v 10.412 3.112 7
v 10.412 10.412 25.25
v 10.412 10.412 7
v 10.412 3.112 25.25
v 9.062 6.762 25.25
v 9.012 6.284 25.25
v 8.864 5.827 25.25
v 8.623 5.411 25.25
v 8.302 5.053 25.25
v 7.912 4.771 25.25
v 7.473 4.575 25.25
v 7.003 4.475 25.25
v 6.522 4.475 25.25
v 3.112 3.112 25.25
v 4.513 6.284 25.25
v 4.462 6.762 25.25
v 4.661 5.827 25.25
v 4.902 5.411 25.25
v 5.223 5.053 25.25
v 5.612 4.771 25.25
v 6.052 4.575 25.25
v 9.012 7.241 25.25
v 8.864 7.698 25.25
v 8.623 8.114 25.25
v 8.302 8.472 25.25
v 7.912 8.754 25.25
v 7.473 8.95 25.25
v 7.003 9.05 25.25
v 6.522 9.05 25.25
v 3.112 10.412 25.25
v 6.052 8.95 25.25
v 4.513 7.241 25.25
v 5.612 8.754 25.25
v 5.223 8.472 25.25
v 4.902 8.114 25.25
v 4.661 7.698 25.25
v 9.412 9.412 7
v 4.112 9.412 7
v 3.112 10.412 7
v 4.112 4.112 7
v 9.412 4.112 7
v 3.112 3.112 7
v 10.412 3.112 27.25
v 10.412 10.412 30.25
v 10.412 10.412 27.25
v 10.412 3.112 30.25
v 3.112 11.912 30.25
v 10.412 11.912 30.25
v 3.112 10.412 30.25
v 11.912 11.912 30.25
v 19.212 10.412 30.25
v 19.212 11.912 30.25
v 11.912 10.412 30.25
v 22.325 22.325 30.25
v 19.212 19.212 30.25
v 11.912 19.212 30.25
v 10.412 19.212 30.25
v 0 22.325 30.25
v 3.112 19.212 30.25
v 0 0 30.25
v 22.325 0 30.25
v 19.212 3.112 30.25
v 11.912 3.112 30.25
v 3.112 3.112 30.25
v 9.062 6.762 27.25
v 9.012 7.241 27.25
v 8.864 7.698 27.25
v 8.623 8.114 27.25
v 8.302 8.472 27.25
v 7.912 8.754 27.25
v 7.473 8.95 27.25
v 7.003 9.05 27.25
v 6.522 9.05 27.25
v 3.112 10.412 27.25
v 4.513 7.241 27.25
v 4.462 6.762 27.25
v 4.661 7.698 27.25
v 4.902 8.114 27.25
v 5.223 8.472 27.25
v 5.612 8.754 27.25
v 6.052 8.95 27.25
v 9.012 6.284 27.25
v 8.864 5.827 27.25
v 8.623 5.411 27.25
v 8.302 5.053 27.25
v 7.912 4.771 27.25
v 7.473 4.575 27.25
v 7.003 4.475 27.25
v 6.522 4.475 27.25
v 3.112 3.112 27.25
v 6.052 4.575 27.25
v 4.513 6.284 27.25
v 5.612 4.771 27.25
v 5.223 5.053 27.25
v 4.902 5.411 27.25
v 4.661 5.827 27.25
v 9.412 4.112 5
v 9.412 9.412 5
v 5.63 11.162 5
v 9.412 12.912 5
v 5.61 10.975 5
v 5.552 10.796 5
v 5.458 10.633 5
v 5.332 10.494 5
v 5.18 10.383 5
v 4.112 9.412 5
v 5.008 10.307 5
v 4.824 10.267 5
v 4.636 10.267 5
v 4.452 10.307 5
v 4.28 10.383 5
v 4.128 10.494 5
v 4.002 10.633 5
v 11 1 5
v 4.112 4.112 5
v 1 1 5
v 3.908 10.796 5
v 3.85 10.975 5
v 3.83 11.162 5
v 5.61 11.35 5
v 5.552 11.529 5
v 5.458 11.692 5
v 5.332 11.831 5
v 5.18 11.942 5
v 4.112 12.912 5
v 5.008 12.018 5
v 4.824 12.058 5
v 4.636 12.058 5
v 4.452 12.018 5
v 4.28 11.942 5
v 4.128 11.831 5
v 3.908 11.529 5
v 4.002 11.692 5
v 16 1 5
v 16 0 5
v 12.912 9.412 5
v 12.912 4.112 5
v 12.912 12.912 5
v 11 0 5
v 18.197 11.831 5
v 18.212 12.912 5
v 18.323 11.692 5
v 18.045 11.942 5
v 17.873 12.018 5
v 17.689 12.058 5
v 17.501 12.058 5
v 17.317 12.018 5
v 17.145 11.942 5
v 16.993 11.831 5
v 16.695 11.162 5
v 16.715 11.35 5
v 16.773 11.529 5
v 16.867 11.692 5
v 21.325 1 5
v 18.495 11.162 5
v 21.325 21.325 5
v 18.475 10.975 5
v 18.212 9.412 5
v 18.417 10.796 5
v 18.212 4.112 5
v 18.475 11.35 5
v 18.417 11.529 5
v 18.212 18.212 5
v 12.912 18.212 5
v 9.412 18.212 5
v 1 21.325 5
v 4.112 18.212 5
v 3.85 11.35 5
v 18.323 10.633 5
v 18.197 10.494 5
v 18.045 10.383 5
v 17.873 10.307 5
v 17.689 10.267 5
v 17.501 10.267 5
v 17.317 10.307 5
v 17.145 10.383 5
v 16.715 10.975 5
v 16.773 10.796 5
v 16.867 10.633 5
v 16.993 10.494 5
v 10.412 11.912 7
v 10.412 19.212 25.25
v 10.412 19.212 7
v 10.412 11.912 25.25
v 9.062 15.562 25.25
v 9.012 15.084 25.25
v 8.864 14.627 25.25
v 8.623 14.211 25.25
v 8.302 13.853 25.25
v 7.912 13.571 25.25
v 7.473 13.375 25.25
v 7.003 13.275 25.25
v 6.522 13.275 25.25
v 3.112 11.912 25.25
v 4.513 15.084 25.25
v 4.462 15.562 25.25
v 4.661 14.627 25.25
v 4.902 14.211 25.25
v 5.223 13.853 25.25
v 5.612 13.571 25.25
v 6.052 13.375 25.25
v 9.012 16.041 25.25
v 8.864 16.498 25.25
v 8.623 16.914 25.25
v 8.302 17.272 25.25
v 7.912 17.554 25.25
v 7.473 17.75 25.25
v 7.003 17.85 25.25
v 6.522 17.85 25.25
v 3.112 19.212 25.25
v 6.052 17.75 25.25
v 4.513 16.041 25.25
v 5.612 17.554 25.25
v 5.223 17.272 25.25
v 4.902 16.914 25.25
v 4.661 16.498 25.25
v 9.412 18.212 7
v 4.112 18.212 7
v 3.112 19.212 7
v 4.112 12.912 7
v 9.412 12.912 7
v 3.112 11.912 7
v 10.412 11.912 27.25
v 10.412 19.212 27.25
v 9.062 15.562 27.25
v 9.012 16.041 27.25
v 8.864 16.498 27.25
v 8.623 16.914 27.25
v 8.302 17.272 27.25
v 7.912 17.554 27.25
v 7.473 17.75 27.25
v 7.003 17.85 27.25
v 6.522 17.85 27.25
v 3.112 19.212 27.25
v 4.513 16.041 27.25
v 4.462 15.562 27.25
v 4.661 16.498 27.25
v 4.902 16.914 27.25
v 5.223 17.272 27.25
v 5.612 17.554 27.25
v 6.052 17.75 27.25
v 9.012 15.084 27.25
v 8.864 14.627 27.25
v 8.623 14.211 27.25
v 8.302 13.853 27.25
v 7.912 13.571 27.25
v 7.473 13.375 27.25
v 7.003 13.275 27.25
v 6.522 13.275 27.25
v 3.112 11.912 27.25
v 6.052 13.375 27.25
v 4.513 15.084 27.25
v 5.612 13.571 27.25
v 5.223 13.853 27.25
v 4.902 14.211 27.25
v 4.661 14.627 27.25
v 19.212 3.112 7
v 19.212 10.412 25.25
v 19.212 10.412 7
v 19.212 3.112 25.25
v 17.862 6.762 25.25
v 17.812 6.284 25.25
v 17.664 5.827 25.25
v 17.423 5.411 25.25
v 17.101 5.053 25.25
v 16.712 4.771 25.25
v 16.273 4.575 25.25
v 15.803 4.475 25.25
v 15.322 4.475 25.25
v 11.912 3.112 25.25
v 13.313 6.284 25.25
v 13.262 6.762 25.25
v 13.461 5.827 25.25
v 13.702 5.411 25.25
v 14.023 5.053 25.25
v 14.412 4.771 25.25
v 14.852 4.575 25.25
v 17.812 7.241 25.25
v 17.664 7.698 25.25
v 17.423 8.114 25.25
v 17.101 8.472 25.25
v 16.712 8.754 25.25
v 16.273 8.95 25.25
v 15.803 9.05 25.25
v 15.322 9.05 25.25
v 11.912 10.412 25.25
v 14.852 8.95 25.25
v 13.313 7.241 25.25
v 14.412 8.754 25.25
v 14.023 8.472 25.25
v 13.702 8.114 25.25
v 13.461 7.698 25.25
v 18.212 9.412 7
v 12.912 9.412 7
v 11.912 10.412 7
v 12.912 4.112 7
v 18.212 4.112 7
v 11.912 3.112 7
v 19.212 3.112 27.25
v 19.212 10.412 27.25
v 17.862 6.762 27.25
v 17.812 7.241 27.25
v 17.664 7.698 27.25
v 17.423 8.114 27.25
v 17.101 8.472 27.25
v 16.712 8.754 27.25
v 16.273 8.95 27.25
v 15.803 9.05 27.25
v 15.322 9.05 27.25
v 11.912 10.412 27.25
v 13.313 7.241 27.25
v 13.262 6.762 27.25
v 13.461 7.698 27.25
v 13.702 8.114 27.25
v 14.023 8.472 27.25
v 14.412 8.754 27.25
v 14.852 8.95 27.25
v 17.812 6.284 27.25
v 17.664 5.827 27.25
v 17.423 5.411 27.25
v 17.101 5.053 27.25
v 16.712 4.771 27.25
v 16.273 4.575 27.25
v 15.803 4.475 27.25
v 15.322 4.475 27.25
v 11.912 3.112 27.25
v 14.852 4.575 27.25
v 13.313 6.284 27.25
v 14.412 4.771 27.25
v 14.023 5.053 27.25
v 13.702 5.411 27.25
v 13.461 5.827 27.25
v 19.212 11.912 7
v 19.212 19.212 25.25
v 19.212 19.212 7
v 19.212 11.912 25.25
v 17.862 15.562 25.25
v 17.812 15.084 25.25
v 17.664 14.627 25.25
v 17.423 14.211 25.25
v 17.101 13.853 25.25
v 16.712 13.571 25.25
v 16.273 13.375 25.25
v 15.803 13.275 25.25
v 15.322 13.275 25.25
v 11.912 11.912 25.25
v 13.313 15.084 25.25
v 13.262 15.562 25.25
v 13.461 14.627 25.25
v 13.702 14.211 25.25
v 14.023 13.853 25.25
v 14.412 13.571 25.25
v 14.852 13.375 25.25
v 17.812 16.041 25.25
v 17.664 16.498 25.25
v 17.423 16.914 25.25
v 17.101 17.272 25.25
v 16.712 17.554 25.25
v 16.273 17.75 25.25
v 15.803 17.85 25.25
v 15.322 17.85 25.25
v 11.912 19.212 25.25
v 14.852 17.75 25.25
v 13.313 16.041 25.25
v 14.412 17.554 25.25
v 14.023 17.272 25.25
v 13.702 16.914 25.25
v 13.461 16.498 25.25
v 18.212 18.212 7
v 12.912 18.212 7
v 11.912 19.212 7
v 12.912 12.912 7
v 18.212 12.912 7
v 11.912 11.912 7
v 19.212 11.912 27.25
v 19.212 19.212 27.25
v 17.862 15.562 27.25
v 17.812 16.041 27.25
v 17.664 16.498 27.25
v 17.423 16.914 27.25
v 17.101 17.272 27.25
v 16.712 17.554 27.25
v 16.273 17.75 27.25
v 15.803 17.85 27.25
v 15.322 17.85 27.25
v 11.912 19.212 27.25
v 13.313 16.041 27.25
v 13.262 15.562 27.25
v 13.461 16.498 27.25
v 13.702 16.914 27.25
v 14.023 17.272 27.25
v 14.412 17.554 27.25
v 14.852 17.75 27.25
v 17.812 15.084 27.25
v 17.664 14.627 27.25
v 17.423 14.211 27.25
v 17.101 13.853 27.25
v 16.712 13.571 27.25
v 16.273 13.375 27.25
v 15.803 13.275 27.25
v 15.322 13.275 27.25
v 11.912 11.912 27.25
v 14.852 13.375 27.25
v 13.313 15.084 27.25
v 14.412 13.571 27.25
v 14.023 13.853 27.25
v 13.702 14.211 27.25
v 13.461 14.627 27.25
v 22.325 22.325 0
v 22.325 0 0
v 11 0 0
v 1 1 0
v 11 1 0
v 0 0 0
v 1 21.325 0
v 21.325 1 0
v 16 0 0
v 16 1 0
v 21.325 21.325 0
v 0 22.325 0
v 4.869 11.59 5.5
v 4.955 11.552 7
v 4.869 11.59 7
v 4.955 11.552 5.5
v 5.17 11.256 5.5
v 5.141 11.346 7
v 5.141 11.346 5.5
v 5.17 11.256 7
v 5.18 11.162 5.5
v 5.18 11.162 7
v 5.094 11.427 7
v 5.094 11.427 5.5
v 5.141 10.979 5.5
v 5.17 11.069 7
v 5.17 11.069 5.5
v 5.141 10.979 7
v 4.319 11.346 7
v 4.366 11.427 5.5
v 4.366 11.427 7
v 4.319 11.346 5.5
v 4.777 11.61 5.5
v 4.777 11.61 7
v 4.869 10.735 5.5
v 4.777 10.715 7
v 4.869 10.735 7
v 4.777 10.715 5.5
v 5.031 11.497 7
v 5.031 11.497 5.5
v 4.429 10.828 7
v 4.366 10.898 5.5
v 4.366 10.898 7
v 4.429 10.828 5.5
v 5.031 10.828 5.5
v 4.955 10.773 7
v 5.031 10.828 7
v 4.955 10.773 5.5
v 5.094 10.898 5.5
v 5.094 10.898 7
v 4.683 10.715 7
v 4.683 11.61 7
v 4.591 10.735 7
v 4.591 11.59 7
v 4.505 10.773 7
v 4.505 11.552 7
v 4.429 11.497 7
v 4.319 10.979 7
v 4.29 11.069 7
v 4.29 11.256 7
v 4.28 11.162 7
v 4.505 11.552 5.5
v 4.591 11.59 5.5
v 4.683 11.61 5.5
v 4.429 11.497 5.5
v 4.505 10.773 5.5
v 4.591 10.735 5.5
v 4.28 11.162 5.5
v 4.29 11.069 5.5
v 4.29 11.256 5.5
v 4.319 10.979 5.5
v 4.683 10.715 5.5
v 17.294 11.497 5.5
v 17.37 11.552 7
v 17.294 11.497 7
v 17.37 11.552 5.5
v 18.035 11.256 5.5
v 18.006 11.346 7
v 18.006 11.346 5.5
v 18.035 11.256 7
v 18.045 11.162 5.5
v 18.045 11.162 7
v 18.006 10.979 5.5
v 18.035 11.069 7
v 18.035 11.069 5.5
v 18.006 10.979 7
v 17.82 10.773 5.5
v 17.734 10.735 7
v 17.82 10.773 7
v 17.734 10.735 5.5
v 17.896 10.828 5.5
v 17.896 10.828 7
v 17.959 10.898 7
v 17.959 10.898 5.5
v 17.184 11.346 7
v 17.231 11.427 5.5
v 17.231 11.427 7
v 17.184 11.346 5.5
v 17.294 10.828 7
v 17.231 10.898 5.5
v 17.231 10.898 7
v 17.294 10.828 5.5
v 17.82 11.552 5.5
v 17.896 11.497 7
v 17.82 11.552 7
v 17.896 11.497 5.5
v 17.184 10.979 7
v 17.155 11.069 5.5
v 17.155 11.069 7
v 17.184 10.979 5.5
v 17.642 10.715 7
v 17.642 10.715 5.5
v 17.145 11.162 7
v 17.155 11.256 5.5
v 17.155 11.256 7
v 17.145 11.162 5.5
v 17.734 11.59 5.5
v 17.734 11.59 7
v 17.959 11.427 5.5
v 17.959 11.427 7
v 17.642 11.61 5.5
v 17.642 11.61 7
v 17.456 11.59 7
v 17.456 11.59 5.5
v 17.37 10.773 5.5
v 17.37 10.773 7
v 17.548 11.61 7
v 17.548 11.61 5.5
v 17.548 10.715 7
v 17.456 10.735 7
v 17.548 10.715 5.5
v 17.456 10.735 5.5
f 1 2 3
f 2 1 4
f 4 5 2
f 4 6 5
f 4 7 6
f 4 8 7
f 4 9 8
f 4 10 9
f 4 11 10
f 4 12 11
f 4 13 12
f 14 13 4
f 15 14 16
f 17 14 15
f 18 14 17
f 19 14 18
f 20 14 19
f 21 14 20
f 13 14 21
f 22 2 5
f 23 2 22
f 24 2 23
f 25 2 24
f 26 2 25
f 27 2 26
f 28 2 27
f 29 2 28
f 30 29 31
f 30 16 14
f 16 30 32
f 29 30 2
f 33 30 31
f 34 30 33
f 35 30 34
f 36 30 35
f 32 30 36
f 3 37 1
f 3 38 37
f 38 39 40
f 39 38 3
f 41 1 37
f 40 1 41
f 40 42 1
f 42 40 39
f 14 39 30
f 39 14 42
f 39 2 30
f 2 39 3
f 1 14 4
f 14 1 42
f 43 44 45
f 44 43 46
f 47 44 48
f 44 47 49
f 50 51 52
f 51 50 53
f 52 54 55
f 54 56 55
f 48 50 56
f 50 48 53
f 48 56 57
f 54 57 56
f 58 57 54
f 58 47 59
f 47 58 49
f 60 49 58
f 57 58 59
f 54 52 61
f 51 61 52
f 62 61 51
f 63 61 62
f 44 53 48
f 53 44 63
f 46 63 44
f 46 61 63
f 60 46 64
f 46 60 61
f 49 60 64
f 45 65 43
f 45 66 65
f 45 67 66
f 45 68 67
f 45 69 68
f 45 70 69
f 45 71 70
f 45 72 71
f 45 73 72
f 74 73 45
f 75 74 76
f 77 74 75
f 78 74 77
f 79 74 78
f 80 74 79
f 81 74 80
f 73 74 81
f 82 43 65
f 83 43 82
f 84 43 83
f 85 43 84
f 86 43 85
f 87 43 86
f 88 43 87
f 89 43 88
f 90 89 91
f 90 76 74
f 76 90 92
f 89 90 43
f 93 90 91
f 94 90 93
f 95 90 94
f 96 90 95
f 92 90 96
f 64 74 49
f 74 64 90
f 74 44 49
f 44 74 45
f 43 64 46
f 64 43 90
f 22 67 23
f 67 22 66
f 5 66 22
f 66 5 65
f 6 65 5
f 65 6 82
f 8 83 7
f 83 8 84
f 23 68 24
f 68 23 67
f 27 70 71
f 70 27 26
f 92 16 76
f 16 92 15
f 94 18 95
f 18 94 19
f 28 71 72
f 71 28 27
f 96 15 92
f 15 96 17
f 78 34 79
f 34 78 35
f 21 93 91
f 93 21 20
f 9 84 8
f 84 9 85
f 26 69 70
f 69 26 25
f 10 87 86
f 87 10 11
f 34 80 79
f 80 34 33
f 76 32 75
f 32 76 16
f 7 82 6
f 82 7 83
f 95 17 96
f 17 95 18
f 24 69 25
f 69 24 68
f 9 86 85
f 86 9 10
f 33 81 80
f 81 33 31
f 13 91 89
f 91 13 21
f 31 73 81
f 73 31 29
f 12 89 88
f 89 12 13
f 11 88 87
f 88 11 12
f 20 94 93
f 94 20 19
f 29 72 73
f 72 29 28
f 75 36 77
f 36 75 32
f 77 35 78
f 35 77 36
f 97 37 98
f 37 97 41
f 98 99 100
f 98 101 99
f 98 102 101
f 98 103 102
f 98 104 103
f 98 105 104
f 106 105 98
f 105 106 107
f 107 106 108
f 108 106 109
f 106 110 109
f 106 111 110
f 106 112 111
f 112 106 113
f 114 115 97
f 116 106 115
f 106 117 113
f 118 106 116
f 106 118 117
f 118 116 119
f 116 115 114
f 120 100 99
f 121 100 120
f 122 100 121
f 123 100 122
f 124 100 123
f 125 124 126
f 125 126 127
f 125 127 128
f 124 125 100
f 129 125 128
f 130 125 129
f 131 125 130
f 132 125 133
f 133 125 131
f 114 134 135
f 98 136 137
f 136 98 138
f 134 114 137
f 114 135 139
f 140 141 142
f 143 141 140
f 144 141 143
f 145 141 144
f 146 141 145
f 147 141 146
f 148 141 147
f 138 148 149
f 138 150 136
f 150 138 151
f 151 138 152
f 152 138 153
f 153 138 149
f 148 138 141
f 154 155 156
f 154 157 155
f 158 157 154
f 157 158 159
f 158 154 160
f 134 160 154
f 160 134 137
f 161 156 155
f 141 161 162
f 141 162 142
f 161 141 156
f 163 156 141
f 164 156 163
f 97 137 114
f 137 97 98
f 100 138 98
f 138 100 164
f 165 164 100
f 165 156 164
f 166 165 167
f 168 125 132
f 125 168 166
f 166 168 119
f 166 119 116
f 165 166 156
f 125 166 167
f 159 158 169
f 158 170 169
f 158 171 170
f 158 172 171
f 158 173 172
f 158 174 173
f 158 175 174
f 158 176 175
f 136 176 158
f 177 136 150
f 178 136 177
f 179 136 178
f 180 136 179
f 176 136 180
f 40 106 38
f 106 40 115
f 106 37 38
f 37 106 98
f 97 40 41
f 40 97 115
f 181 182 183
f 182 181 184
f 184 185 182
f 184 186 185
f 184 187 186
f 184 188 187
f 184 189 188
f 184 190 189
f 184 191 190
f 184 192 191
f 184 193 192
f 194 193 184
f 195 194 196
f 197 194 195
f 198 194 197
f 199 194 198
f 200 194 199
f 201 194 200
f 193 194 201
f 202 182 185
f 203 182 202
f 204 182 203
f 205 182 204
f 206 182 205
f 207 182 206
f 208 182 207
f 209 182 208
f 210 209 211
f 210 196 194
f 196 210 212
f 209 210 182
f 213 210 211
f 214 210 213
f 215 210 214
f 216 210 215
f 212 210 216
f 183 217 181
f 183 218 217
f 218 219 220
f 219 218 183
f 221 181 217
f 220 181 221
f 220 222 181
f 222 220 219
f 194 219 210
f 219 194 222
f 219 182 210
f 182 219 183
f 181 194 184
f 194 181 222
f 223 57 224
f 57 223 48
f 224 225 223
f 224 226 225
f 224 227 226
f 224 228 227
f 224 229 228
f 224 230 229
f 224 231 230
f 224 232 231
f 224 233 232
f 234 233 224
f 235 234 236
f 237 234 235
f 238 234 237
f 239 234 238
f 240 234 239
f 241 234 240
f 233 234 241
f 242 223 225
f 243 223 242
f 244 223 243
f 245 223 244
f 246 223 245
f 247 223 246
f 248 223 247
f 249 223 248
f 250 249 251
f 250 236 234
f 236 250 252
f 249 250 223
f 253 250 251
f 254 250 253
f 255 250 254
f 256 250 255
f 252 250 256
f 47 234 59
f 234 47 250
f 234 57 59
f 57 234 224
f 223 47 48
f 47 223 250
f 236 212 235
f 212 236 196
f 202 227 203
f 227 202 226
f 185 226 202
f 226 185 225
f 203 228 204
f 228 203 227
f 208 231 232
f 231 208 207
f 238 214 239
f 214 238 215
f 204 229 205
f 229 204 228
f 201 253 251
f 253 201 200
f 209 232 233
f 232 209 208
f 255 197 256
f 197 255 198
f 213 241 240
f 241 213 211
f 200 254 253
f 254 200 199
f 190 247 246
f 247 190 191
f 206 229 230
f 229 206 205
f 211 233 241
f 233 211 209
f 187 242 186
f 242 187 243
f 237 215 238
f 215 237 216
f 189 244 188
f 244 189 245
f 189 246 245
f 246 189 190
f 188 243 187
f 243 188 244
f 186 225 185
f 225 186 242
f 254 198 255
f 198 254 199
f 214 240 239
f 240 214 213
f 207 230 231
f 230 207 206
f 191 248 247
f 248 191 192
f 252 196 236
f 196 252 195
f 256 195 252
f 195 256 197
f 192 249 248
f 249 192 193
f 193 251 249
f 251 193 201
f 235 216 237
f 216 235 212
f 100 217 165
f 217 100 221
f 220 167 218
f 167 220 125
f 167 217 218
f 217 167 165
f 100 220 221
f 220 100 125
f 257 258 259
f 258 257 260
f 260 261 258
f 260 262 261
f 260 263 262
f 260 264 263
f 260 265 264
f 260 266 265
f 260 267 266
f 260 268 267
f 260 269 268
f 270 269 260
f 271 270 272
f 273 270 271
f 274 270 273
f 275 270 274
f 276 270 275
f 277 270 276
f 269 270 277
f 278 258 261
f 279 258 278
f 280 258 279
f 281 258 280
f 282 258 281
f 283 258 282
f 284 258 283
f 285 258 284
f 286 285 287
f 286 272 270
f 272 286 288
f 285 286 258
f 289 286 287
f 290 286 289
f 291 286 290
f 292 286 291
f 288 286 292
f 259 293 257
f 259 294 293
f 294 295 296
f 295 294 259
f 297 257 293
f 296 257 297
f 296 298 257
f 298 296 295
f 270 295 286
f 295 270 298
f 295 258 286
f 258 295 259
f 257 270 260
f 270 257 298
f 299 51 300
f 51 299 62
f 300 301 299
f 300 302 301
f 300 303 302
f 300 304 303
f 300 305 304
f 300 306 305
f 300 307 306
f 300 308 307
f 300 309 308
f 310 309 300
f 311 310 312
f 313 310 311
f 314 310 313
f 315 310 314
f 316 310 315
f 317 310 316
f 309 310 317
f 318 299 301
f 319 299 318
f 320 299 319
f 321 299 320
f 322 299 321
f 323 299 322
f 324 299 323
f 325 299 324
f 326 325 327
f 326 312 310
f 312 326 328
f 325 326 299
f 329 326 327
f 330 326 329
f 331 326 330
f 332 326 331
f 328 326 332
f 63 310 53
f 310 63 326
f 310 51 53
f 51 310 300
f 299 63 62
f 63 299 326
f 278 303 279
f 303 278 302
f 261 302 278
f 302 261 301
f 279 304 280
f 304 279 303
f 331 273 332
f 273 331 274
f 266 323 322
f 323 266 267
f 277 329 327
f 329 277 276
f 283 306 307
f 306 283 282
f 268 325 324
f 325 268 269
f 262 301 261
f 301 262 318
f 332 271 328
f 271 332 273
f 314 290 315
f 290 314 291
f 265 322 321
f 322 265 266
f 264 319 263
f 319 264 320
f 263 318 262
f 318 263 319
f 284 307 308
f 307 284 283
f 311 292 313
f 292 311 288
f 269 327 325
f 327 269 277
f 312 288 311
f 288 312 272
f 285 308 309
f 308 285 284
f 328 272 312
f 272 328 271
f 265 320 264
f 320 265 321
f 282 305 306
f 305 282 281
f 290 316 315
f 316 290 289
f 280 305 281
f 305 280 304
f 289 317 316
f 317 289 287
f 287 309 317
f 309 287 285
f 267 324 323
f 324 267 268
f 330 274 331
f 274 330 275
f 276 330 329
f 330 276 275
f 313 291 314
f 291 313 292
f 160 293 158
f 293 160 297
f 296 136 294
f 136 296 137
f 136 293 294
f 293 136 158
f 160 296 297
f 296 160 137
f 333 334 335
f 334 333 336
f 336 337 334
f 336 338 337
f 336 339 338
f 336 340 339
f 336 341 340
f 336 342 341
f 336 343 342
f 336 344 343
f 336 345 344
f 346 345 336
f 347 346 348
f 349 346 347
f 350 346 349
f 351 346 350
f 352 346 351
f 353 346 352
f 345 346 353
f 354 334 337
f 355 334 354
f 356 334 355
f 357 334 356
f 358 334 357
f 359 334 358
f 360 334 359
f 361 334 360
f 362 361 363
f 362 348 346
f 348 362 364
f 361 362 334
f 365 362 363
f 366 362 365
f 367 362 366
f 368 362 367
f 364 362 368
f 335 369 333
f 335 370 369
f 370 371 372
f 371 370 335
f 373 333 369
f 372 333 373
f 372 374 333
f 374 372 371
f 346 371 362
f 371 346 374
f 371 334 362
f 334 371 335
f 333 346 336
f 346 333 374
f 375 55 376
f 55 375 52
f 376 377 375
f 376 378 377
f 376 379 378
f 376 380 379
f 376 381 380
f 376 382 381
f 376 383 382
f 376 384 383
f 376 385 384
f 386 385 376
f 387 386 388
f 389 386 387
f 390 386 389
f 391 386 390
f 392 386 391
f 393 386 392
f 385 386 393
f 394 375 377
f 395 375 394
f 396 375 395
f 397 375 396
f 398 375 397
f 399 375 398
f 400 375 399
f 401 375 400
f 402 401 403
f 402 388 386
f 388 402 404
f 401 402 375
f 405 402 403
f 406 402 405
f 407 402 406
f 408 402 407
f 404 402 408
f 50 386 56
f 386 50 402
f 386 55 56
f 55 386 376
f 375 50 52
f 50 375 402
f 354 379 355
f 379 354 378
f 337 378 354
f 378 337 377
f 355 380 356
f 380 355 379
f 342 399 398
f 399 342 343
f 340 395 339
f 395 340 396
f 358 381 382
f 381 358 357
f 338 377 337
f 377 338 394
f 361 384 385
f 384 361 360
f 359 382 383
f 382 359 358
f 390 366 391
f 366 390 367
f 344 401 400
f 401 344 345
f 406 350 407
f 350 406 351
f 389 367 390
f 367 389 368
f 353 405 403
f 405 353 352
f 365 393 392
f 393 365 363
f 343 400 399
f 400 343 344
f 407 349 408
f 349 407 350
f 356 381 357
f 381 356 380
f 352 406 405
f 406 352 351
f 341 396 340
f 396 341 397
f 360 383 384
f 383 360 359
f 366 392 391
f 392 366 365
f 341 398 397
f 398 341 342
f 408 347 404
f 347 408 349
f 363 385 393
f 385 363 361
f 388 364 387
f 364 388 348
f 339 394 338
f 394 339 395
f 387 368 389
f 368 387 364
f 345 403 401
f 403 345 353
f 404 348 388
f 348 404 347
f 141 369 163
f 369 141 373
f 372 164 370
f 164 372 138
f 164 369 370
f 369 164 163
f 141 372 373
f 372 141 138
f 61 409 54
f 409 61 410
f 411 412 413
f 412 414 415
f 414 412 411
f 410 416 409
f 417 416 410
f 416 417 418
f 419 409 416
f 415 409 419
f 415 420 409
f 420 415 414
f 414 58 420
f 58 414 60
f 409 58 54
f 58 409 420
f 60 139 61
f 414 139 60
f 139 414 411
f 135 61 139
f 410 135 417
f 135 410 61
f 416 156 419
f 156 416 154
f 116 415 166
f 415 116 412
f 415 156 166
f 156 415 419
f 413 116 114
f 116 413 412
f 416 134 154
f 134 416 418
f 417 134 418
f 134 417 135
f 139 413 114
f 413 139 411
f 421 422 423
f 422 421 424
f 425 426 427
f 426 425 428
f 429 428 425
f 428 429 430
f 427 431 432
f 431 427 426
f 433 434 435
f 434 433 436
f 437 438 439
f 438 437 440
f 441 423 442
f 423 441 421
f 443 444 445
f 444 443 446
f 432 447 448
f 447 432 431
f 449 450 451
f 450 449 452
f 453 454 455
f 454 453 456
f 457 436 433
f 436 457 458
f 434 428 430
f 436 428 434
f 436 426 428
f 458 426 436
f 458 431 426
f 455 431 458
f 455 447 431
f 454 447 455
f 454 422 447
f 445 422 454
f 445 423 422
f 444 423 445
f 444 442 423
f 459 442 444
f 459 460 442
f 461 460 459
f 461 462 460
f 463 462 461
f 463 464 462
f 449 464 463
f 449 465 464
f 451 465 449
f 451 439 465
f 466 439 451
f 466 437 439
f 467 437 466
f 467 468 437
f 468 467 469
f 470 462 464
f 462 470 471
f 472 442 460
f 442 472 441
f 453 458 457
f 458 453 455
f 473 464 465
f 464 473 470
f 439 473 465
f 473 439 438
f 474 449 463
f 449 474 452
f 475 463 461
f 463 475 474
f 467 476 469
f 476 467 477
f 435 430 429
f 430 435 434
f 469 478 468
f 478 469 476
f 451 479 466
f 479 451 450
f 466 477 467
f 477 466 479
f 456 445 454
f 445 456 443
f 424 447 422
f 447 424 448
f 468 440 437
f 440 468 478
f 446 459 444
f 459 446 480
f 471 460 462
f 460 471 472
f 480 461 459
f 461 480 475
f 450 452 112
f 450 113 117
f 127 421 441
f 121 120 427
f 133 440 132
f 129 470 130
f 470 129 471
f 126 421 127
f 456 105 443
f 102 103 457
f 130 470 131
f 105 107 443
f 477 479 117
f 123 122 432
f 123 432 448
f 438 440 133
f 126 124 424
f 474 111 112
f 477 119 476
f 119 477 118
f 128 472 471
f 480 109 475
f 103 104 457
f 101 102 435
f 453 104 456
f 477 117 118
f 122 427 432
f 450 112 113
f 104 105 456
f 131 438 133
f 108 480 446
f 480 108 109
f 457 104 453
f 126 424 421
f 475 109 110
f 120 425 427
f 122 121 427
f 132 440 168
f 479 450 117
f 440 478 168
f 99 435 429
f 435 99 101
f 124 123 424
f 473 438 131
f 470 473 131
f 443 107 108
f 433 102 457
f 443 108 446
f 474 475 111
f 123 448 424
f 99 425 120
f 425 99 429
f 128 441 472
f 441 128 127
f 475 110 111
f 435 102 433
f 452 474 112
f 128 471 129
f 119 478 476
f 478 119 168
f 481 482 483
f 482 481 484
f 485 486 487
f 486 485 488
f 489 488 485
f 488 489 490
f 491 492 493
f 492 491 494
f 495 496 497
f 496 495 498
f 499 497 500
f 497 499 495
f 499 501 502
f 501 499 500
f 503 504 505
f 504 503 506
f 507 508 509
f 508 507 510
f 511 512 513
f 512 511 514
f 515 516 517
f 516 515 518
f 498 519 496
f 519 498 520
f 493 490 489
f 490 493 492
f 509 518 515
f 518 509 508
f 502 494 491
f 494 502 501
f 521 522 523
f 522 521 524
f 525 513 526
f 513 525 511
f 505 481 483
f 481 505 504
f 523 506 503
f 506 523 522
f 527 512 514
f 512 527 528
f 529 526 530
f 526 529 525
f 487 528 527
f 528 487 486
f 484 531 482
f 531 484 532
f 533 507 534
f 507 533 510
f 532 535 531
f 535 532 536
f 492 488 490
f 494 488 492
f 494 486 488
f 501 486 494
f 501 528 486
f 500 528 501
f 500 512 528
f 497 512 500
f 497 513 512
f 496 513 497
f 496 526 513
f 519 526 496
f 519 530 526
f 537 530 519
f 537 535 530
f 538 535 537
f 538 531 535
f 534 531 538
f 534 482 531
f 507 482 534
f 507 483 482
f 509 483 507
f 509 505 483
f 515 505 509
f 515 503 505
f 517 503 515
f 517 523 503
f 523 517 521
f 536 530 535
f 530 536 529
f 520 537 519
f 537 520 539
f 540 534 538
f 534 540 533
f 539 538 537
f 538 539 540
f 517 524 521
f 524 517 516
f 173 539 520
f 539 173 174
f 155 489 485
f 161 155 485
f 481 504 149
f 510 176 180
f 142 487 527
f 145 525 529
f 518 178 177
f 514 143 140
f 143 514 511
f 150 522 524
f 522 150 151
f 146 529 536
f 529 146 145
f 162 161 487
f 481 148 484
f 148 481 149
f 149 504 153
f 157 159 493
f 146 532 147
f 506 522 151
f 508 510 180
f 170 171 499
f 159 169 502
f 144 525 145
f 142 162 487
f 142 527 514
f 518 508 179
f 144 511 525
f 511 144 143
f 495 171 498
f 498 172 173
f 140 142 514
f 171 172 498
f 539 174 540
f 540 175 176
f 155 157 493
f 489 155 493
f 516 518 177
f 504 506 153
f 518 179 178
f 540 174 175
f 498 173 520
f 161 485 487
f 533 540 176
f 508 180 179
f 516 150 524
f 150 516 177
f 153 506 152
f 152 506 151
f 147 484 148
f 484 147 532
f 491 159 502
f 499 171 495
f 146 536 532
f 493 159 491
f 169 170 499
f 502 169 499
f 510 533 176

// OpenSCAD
looseTol = 0.1;

// measured
LEDSize = 4.9;
LEDTol = .2;
LEDPitch = 8.8;
LEDBoardSize = 71.3/4 + 0.5;
LEDPenetration = 1.0;
WireOffset = 9.0;
pilotHoleOffset = 2.73;
pilotHoleDiameter = .9;


EppendorfDiameter = 4.5 + looseTol;
EppendorfHeight = 23.25;
EppendorfLidHeight = 5;

NumX = 2;
NumY = 2;

// variables
IntWallThicknessXY = 1.5;
IntWallThicknessZ = 2.0;
ExtWallThickness = 1.0;
BaseChamberHeight = 5.0;
LEDBoardSpace = 1.0;
LEDEppendorfGap = 3.0;
HeadChamberHeight = 3.0;
ConeHeight = 12.0;
PilotHoleTaperHeight = 0.5;

// Derived Values
XLength = 2 * ExtWallThickness + 2 * LEDBoardSpace + LEDBoardSize;
YLength = XLength;
ZLength = BaseChamberHeight + LEDPenetration + LEDEppendorfGap + EppendorfHeight + HeadChamberHeight - EppendorfLidHeight;
InternalChamberHeight = ZLength - HeadChamberHeight - IntWallThicknessZ - IntWallThicknessZ - BaseChamberHeight;
InternalChamberWidth = LEDPitch - IntWallThicknessXY;
WireHoleX = 5;
WireHoleZ = BaseChamberHeight;
XArrayEdge = XLength/2.0 - LEDPitch * NumX/2.0 + IntWallThicknessXY/2.0;
YArrayEdge = YLength/2.0 - LEDPitch * NumY/2.0 + IntWallThicknessXY/2.0;


Smoothness = 30;

NumLidX = 1;
NumLidY = 1;
LidThicknessZ = 1.0;
LidOffsetZ = ZLength - LidThicknessZ;
LidHandleLength = 5.0;
LidHandleDiameter = 2.0;


//Lids();
LightBox();

module Lids() {
union(){
 // Array
   for ( XIndex = [0:NumLidX - 1] ){
      for ( YIndex = [0:NumLidX - 1] ){
         // Lid Plates
//         translate([XArrayEdge + XIndex*LEDPitch, YArrayEdge + YIndex*LEDPitch, LidOffsetZ + LidThicknessZ])
//         cube([LEDPitch - 2 * LEDTol, LEDPitch - 2 * LEDTol, LidThicknessZ], false);
         
         // Lid Inserts
//         translate([XArrayEdge + XIndex*LEDPitch + IntWallThicknessXY/2.0, YArrayEdge + YIndex*LEDPitch + IntWallThicknessXY/2.0, LidOffsetZ])
//         cube([InternalChamberWidth - 2 * looseTol, InternalChamberWidth - 2 * looseTol, LidThicknessZ], false);

         // Lid Pyramids
         translate([XArrayEdge + InternalChamberWidth/2.0 + XIndex*LEDPitch, YArrayEdge + InternalChamberWidth/2.0 + YIndex*LEDPitch, LidOffsetZ])
         rotate(45, [0, 0, 1])
         cylinder(2 * LidThicknessZ, sqrt(2) * 0.8 * InternalChamberWidth/2.0, sqrt(2) * (LEDPitch - 2 * LEDTol)/2.0, $fn=4);


         // Lid Handles
         translate([XArrayEdge + InternalChamberWidth/2.0 + XIndex*LEDPitch, YArrayEdge + InternalChamberWidth/2.0 + YIndex*LEDPitch, LidOffsetZ + 2 * LidThicknessZ])
         cylinder(LidHandleLength, LidHandleDiameter/2.0, LidHandleDiameter/2.0, $fn=Smoothness);
      }
   }//for loop
}
}

module LightBox() {
difference() {
   // Basic Cube
   cube([XLength, YLength, ZLength], false);

   // LED Insert
   translate([ExtWallThickness, ExtWallThickness, 0])
   cube([LEDBoardSize + 2 * LEDBoardSpace, LEDBoardSize + 2 * LEDBoardSpace, BaseChamberHeight], false);

   // Wire Duct
   translate([ExtWallThickness + LEDBoardSpace + WireOffset, 0, 0])
   cube([WireHoleX, ExtWallThickness, WireHoleZ], false);

   // pilot holes for screws
   translate([ExtWallThickness + LEDBoardSpace + pilotHoleOffset, YLength/2.0, BaseChamberHeight])
   cylinder(IntWallThicknessZ, pilotHoleDiameter/2.0, pilotHoleDiameter/2.0, false, $fn=Smoothness);
    //added taper so that these holes can be accessed
    translate([ExtWallThickness + LEDBoardSpace + pilotHoleOffset, YLength/2.0, BaseChamberHeight])
      cylinder(PilotHoleTaperHeight,pilotHoleDiameter, pilotHoleDiameter/2.0, false, $fn=Smoothness);
    
   translate([XLength - ExtWallThickness - LEDBoardSpace - pilotHoleOffset, YLength/2.0, BaseChamberHeight])
   cylinder(IntWallThicknessZ, pilotHoleDiameter/2.0, pilotHoleDiameter/2.0, false, $fn=Smoothness);
    
   translate([XLength - ExtWallThickness - LEDBoardSpace - pilotHoleOffset, YLength/2.0, BaseChamberHeight])
   cylinder(PilotHoleTaperHeight, pilotHoleDiameter, pilotHoleDiameter/2.0, false, $fn=Smoothness);
   
   // Array
   for ( XIndex = [0:NumX - 1] ){
      for ( YIndex = [0:NumX - 1] ){
         // Internal Chambers
         translate([XArrayEdge + XIndex*LEDPitch, YArrayEdge + YIndex*LEDPitch, BaseChamberHeight + IntWallThicknessZ])
         cube([InternalChamberWidth, InternalChamberWidth, InternalChamberHeight/*-ConeHeight*/], false);
          //made shorterto allow support cone to be added

         // Head Chambers
         translate([XArrayEdge + XIndex*LEDPitch, YArrayEdge + YIndex*LEDPitch, ZLength - HeadChamberHeight])
         cube([InternalChamberWidth, InternalChamberWidth, HeadChamberHeight], false);

         // Eppendorf Holes
         translate([XArrayEdge + InternalChamberWidth/2.0 + XIndex*LEDPitch, YArrayEdge + InternalChamberWidth/2.0 + YIndex*LEDPitch, ZLength - HeadChamberHeight - IntWallThicknessZ])
         cylinder(IntWallThicknessZ, EppendorfDiameter/2.0, EppendorfDiameter/2.0, $fn=Smoothness);
          
        //Support Cone 
      //   intersection() {
        
     //    translate([XArrayEdge + InternalChamberWidth/2.0 + XIndex*LEDPitch, YArrayEdge + InternalChamberWidth/2.0 + YIndex*LEDPitch, ZLength - HeadChamberHeight-IntWallThicknessZ-ConeHeight])
    //     cylinder(ConeHeight,sqrt(2)*InternalChamberWidth, EppendorfDiameter/2.0, $fn=Smoothness);
             
    //     translate([XArrayEdge + XIndex*LEDPitch, YArrayEdge + YIndex*LEDPitch, ZLength - HeadChamberHeight-IntWallThicknessZ-ConeHeight])
     //    cube([InternalChamberWidth, InternalChamberWidth, ConeHeight], false);
          
   //      } //intersection

         // LED Holes
         translate([XArrayEdge + InternalChamberWidth/2.0 + XIndex*LEDPitch, YArrayEdge + InternalChamberWidth/2.0 + YIndex*LEDPitch, BaseChamberHeight + IntWallThicknessZ/2.0])
         cube([LEDSize + 2* LEDTol, LEDSize + 2* LEDTol, IntWallThicknessZ], true);
      }
   }//for loop
} // difference
          
}
